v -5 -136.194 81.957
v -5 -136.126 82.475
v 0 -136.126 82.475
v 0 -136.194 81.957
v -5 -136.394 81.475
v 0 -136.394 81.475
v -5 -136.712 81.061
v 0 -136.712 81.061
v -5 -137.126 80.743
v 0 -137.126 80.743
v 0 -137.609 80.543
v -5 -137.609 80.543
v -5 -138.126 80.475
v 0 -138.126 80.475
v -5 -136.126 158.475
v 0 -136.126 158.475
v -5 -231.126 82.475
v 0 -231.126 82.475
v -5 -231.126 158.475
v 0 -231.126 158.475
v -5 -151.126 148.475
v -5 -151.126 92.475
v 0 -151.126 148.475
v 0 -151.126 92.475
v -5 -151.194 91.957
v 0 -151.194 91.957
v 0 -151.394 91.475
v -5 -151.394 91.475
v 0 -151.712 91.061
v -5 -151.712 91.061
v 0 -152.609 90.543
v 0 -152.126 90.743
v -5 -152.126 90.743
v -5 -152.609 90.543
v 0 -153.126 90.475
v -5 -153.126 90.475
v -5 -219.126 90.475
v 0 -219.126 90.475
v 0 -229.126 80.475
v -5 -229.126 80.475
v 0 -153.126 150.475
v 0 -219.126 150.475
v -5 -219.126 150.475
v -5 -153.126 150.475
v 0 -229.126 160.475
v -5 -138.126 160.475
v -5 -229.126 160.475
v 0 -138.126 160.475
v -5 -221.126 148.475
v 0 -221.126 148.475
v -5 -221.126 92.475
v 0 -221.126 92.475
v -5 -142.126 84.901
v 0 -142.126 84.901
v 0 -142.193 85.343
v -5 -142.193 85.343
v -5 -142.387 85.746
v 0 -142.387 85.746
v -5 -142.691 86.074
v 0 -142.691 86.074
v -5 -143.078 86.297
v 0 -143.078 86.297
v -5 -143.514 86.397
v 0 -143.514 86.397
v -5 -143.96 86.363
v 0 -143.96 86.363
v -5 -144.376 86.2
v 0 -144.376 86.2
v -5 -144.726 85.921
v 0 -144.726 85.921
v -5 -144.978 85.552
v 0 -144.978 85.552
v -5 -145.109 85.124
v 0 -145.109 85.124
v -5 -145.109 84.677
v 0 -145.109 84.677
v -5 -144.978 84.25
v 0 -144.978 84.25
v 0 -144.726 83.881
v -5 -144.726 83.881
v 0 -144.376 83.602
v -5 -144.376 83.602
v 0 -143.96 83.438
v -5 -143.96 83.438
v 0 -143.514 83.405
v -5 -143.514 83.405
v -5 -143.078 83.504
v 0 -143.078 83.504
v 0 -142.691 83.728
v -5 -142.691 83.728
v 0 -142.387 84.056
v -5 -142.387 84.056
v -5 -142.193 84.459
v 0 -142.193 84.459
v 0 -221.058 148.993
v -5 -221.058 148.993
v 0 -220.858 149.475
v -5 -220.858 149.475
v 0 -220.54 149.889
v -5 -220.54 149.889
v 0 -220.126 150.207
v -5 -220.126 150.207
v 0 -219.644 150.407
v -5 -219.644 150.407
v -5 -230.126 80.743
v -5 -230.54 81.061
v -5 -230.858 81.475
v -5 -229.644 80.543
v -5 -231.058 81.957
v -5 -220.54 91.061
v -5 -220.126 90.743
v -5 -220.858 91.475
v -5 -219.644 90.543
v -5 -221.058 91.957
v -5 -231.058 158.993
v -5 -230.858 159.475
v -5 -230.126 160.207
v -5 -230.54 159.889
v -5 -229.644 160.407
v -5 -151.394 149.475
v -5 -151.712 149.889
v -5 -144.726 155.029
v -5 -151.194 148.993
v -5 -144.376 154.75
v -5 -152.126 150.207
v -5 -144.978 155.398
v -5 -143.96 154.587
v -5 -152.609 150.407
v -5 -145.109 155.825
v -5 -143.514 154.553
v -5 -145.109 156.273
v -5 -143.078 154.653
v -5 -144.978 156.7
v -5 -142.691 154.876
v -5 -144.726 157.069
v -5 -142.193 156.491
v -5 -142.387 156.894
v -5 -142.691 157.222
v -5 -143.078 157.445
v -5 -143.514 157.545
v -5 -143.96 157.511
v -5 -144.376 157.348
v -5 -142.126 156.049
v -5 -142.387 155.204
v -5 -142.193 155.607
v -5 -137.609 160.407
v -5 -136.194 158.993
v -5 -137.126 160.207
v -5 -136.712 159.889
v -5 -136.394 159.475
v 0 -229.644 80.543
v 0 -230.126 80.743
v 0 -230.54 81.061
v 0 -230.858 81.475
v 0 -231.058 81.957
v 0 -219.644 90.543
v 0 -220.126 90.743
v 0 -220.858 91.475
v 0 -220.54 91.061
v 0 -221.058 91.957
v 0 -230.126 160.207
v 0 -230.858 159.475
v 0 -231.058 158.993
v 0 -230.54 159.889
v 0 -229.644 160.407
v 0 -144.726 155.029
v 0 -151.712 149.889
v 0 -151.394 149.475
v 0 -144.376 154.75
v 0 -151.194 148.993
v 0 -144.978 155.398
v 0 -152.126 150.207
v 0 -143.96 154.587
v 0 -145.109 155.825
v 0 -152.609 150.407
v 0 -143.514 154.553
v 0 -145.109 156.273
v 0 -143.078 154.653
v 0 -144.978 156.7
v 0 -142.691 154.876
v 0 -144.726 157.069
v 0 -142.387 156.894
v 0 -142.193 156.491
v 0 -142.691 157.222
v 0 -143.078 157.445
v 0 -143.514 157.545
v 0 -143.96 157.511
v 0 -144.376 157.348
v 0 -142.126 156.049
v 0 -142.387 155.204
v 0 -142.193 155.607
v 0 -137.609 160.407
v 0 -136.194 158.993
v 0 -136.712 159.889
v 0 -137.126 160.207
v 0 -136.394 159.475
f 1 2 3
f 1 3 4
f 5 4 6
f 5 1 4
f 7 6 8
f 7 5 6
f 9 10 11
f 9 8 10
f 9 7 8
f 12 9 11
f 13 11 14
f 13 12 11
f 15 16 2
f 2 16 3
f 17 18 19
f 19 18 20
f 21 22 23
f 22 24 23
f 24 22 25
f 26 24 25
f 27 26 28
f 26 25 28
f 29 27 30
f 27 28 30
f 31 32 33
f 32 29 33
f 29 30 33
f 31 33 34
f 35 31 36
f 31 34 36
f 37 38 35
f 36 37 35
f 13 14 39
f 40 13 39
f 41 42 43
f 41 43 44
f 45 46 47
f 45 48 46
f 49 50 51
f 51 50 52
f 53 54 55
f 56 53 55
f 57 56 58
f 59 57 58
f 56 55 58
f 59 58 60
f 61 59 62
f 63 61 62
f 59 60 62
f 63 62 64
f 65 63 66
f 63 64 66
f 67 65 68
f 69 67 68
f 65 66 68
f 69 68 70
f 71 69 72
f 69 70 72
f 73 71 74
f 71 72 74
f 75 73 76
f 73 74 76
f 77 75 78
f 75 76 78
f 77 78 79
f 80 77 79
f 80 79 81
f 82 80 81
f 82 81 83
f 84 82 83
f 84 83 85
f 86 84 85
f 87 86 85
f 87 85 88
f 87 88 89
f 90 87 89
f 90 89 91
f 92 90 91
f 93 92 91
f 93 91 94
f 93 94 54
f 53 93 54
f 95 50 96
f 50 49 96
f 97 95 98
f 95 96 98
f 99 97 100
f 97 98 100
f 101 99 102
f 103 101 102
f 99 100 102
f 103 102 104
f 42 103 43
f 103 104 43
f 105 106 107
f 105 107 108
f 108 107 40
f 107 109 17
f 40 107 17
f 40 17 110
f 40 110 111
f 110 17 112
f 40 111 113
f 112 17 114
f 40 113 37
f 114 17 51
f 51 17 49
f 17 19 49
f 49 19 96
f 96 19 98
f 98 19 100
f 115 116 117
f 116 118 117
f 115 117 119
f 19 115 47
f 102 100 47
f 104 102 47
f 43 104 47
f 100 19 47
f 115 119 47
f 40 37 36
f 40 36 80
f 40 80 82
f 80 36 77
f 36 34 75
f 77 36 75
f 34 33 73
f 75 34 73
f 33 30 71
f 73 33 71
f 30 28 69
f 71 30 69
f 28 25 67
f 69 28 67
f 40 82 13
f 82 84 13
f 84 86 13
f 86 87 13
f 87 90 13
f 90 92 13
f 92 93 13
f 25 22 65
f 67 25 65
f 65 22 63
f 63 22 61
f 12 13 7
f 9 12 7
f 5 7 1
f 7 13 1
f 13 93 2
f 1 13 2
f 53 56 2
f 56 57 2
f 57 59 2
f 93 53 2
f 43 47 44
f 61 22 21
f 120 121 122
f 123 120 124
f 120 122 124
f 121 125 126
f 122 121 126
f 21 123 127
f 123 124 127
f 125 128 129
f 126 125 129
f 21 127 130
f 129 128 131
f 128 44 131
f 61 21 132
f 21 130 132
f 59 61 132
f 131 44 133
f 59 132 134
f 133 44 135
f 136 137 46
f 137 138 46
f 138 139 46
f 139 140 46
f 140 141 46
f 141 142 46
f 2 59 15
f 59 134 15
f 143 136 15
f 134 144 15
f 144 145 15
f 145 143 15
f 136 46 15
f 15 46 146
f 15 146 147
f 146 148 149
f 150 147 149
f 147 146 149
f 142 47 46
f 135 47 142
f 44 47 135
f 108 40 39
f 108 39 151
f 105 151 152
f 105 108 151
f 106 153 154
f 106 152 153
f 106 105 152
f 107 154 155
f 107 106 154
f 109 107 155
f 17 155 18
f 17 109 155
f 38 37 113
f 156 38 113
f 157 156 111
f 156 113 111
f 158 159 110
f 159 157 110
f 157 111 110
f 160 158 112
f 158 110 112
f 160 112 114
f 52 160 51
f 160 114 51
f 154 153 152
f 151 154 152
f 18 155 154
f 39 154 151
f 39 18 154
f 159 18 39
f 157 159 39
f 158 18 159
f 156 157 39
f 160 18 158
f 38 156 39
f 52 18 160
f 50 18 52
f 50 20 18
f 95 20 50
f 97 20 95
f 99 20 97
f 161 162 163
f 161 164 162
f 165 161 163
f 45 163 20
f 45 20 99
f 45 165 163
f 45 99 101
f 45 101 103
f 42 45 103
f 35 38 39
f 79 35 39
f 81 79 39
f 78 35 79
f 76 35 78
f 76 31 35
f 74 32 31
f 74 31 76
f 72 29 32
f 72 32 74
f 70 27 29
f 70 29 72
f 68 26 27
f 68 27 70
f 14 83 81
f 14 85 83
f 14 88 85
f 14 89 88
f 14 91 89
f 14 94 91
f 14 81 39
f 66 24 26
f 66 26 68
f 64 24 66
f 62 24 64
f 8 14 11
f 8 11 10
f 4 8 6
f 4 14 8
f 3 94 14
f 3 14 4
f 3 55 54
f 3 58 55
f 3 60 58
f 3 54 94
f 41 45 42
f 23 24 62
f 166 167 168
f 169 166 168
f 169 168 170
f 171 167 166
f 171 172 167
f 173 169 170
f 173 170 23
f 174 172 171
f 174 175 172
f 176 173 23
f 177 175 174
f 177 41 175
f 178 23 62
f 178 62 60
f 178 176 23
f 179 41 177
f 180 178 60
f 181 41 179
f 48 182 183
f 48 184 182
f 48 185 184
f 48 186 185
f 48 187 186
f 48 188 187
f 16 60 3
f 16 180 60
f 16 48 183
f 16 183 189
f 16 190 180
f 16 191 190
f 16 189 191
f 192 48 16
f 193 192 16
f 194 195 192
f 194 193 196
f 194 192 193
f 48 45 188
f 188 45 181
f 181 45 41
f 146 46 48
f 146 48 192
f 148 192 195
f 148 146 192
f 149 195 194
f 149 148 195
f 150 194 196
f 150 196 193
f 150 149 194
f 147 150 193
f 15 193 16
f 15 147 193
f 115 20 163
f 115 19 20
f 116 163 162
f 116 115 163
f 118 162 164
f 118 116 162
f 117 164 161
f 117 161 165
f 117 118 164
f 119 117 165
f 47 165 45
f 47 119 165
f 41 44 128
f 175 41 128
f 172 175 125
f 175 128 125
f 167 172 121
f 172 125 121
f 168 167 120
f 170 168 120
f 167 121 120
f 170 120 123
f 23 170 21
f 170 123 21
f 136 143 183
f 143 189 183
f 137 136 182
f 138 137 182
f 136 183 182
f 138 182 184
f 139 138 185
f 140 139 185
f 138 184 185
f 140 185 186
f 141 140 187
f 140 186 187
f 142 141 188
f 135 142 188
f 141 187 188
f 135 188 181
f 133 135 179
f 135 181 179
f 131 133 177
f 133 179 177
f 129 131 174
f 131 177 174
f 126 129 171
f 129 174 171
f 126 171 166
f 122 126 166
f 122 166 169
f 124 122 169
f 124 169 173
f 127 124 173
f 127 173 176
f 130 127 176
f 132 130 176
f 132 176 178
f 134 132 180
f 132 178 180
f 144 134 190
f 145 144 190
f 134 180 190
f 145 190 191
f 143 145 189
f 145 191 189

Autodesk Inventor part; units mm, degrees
ref_plane "YZ Plane" through (0, 0, 0) normal (1, 0, 0) x (0, 1, 0)
ref_plane "XZ Plane" through (0, 0, 0) normal (0, 1, 0) x (-1, 0, 0)
ref_plane "XY Plane" through (0, 0, 0) normal (0, 0, 1) x (1, 0, 0)
sketch "スケッチ1" plane through (0, 0, 0) normal (1, 0, 0) x (0, 1, 0)
  line L0 (-151.1262, 435.4749) -> (478.8738, 435.4749)
  line L1 (478.8738, 435.4749) -> (478.8738, -194.5251)
  line L2 (478.8738, -194.5251) -> (-151.1262, -194.5251)
  line L3 (-151.1262, -194.5251) -> (-151.1262, 435.4749)
  line L4 (-151.1262, 435.4749) -> (478.8738, -194.5251) construction
  line L5 (478.8738, 435.4749) -> (-151.1262, -194.5251) construction
  line L6 (-151.1262, 342.6932) -> (-136.1262, 342.6932)
  line L7 (-136.1262, 342.6932) -> (-136.1262, -101.7433)
  line L8 (-136.1262, -101.7433) -> (-151.1262, -101.7433)
  line L9 (-151.1262, -101.7433) -> (-151.1262, 342.6932)
  line L10 (386.092, 435.4749) -> (-58.3445, 435.4749)
  line L11 (-58.3445, 435.4749) -> (-58.3445, 420.4749)
  line L12 (-58.3445, 420.4749) -> (386.092, 420.4749)
  line L13 (386.092, 420.4749) -> (386.092, 435.4749)
  line L14 (-58.3445, 420.4749) -> (-136.1262, 342.6932)
  line L15 (-136.1262, 342.6932) -> (-136.1262, 435.4749)
  line L16 (-58.3445, 420.4749) -> (-136.1262, 342.6932)
  line L17 (-136.1262, 342.6932) -> (-129.0552, 335.6221)
  line L18 (-129.0552, 335.6221) -> (-51.2734, 413.4039)
  line L19 (-51.2734, 413.4039) -> (-58.3445, 420.4749)
  line L20 (53.0814, 420.4749) -> (-136.1262, 231.2673)
  line L21 (53.0814, 420.4749) -> (-136.1262, 231.2673)
  line L22 (-136.1262, 231.2673) -> (-129.0552, 224.1962)
  line L23 (-129.0552, 224.1962) -> (60.1525, 413.4039)
  line L24 (60.1525, 413.4039) -> (53.0814, 420.4749)
  line L25 (163.8738, 120.4749) -> (-792.7235, 120.4749)
  line L26 (-58.3445, -179.5251) -> (-136.1262, -101.7433)
  line L27 (-136.1262, -101.7433) -> (-129.0552, -94.6723)
  line L28 (-129.0552, -94.6723) -> (-51.2734, -172.454)
  line L29 (-51.2734, -172.454) -> (-58.3445, -179.5251)
  line L30 (53.0814, -179.5251) -> (-136.1262, 9.6826)
  line L31 (-136.1262, 9.6826) -> (-129.0552, 16.7536)
  line L32 (-129.0552, 16.7536) -> (60.1525, -172.454)
  line L33 (60.1525, -172.454) -> (53.0814, -179.5251)
  circle A0 centre (163.8738, 120.4749) radius 400
  line L34 (-166.1262, 145.4749) -> (-216.1262, 145.4749)
  line L35 (-216.1262, 145.4749) -> (-216.1262, 95.4749)
  line L36 (-216.1262, 95.4749) -> (-166.1262, 95.4749)
  line L37 (-166.1262, 95.4749) -> (-166.1262, 145.4749)
  line L38 (163.8738, 120.4749) -> (163.8738, -510.4429)
  line L39 (386.092, 420.4749) -> (463.8738, 342.6932)
  line L40 (463.8738, 342.6932) -> (456.8027, 335.6221)
  line L41 (456.8027, 335.6221) -> (379.0209, 413.4039)
  line L42 (379.0209, 413.4039) -> (386.092, 420.4749)
  line L43 (274.6661, 420.4749) -> (463.8738, 231.2673)
  line L44 (463.8738, 231.2673) -> (456.8027, 224.1962)
  line L45 (456.8027, 224.1962) -> (267.5951, 413.4039)
  line L46 (267.5951, 413.4039) -> (274.6661, 420.4749)
  line L47 (456.8027, 16.7536) -> (267.5951, -172.454)
  line L48 (463.8738, 9.6826) -> (456.8027, 16.7536)
  line L49 (274.6661, -179.5251) -> (463.8738, 9.6826)
  line L50 (267.5951, -172.454) -> (274.6661, -179.5251)
  line L51 (463.8738, -101.7433) -> (456.8027, -94.6723)
  line L52 (386.092, -179.5251) -> (463.8738, -101.7433)
  line L53 (456.8027, -94.6723) -> (379.0209, -172.454)
  line L54 (379.0209, -172.454) -> (386.092, -179.5251)
  line L55 (-151.1262, 160.4749) -> (-231.1262, 160.4749)
  line L56 (-231.1262, 160.4749) -> (-231.1262, 150.4749)
  line L57 (-231.1262, 150.4749) -> (-151.1262, 150.4749)
  line L58 (-151.1262, 150.4749) -> (-151.1262, 160.4749)
  line L59 (-231.1262, 150.4749) -> (-221.1262, 150.4749)
  line L60 (-221.1262, 150.4749) -> (-221.1262, 120.4749)
  line L61 (-221.1262, 120.4749) -> (-231.1262, 120.4749)
  line L62 (-231.1262, 120.4749) -> (-231.1262, 150.4749)
  line L63 (463.8738, 342.6932) -> (478.8738, 342.6932)
  line L64 (478.8738, 342.6932) -> (478.8738, -101.7433)
  line L65 (478.8738, -101.7433) -> (463.8738, -101.7433)
  line L66 (463.8738, -101.7433) -> (463.8738, 342.6932)
  line L67 (-58.3445, -194.5251) -> (386.092, -194.5251)
  line L68 (386.092, -194.5251) -> (386.092, -179.5251)
  line L69 (386.092, -179.5251) -> (-58.3445, -179.5251)
  line L70 (-58.3445, -179.5251) -> (-58.3445, -194.5251)
  line L71 (378.3744, 409.2217) -> (452.6206, 334.9755)
  line L72 (452.6206, 334.9755) -> (417.8105, 300.1654)
  line L73 (417.8105, 300.1654) -> (343.5643, 374.4116)
  line L74 (343.5643, 374.4116) -> (378.3744, 409.2217)
  line L75 (478.8738, 435.4749) -> (163.8738, 120.4749)
  line L76 (478.8738, 265.4749) -> (-151.1262, 265.4749)
  line L77 (-151.1262, 265.4749) -> (-151.1262, 245.4749)
  line L78 (-151.1262, 245.4749) -> (478.8738, 245.4749)
  line L79 (478.8738, 245.4749) -> (478.8738, 265.4749)
  line L80 (478.8738, -24.5251) -> (-151.1262, -24.5251)
  line L81 (-151.1262, -4.5251) -> (478.8738, -4.5251)
  line L82 (478.8738, 265.4749) -> (498.8738, 265.4749)
  line L83 (498.8738, 265.4749) -> (498.8738, 285.4749)
  line L84 (498.8738, 285.4749) -> (478.8738, 285.4749)
  line L85 (478.8738, 285.4749) -> (478.8738, 265.4749)
  line L86 (478.8738, -24.5251) -> (498.8738, -24.5251)
  line L87 (498.8738, -24.5251) -> (498.8738, -44.5251)
  line L88 (498.8738, -44.5251) -> (478.8738, -44.5251)
  line L89 (478.8738, -44.5251) -> (478.8738, -24.5251)
  line L90 (498.8738, 285.4749) -> (511.3738, 285.4749)
  line L91 (504.3091, -44.5251) -> (494.3091, -44.5251)
  circle A1 centre (675.8738, 120.4749) radius 122.5
  line L92 (478.8738, 265.4749) -> (498.8738, 265.4749)
  line L93 (498.8738, 265.4749) -> (498.8738, 245.4749)
  line L94 (498.8738, 245.4749) -> (478.8738, 245.4749)
  line L95 (478.8738, 245.4749) -> (478.8738, 265.4749)
  line L96 (478.8738, -24.5251) -> (498.8738, -24.5251)
  line L97 (498.8738, -24.5251) -> (498.8738, -4.5251)
  line L98 (498.8738, -4.5251) -> (478.8738, -4.5251)
  line L99 (478.8738, -4.5251) -> (478.8738, -24.5251)
  line L100 (289.8738, 265.4749) -> (309.8738, 265.4749)
  line L101 (309.8738, 265.4749) -> (309.8738, 285.4749)
  line L102 (309.8738, 285.4749) -> (289.8738, 285.4749)
  line L103 (289.8738, 285.4749) -> (289.8738, 265.4749)
  line L104 (-129.0552, 335.6221) -> (-151.1262, 335.6221)
  circle A2 centre (-143.6262, 352.4749) radius 1.5
  circle A3 centre (-143.6262, 342.4749) radius 1.5
  line L105 (-136.1262, 362.4749) -> (-151.1262, 362.4749)
  line L106 (-58.3445, 427.9749) -> (-143.6262, 427.9749)
  line L107 (-143.6262, 427.9749) -> (-143.6262, 362.4749)
  circle A4 centre (-68.1262, 427.9749) radius 1.5
  circle A5 centre (-58.1262, 427.9749) radius 1.5
  line L108 (-78.1262, 435.4749) -> (-78.1262, 420.4749)
  line L109 (-58.3445, 420.4749) -> (-78.1262, 420.4749)
  circle A6 centre (-68.1262, -187.0251) radius 1.5
  circle A7 centre (-58.1262, -187.0251) radius 1.5
  circle A8 centre (-143.6262, -111.5251) radius 1.5
  circle A9 centre (-143.6262, -101.5251) radius 1.5
  line L110 (-136.1262, -121.5251) -> (-151.1262, -121.5251)
  line L111 (-78.1262, -194.5251) -> (-78.1262, -179.5251)
  line L112 (405.8738, 435.4749) -> (405.8738, 420.4749)
  circle A10 centre (395.8738, 427.9749) radius 1.5
  circle A11 centre (385.8738, 427.9749) radius 1.5
  line L113 (463.8738, 362.4749) -> (478.8738, 362.4749)
  circle A12 centre (471.3738, 352.4749) radius 1.5
  circle A13 centre (471.3738, 342.4749) radius 1.5
  line L114 (463.8738, -121.5251) -> (478.8738, -121.5251)
  circle A14 centre (471.3738, -111.5251) radius 1.5
  circle A15 centre (471.3738, -101.5251) radius 1.5
  line L115 (405.8738, -194.5251) -> (405.8738, -179.5251)
  circle A16 centre (395.8738, -187.0251) radius 1.5
  circle A17 centre (385.8738, -187.0251) radius 1.5
  line L116 (-136.1262, -101.7433) -> (-136.1262, -121.5251)
  line L117 (-58.3445, -179.5251) -> (-78.1262, -179.5251)
  line L118 (405.8738, -179.5251) -> (386.092, -179.5251)
  line L119 (463.8738, -101.7433) -> (463.8738, -121.5251)
  line L120 (463.8738, 362.4749) -> (463.8738, 342.6932)
  line L121 (386.092, 420.4749) -> (405.8738, 420.4749)
  circle A18 centre (-129.0552, 342.6932) radius 1.5
  circle A19 centre (-121.9841, 349.7643) radius 1.5
  circle A20 centre (-129.0552, 231.2673) radius 1.5
  circle A21 centre (-121.9841, 238.3384) radius 1.5
  circle A22 centre (-65.4156, 406.3328) radius 1.5
  circle A23 centre (-58.3445, 413.4039) radius 1.5
  circle A24 centre (46.0103, 406.3328) radius 1.5
  circle A25 centre (53.0814, 413.4039) radius 1.5
  circle A26 centre (-58.3445, -172.454) radius 1.5
  circle A27 centre (-65.4156, -165.3829) radius 1.5
  circle A28 centre (53.0814, -172.454) radius 1.5
  circle A29 centre (46.0103, -165.3829) radius 1.5
  circle A30 centre (-129.0552, -101.7433) radius 1.5
  circle A31 centre (-121.9841, -108.8144) radius 1.5
  circle A32 centre (-121.9841, 2.6115) radius 1.5
  circle A33 centre (-129.0552, 9.6826) radius 1.5
  circle A34 centre (456.8027, 9.6826) radius 1.5
  circle A35 centre (449.7316, 2.6115) radius 1.5
  circle A36 centre (456.8027, -101.7433) radius 1.5
  circle A37 centre (449.7316, -108.8144) radius 1.5
  circle A38 centre (393.1631, -165.3829) radius 1.5
  circle A39 centre (386.092, -172.454) radius 1.5
  circle A40 centre (281.7372, -165.3829) radius 1.5
  circle A41 centre (274.6661, -172.454) radius 1.5
  circle A42 centre (449.7316, 238.3384) radius 1.5
  circle A43 centre (456.8027, 231.2673) radius 1.5
  circle A44 centre (456.8027, 342.6932) radius 1.5
  circle A45 centre (449.7316, 349.7643) radius 1.5
  circle A46 centre (393.1631, 406.3328) radius 1.5
  circle A47 centre (386.092, 413.4039) radius 1.5
  circle A48 centre (274.6661, 413.4039) radius 1.5
  circle A49 centre (281.7372, 406.3328) radius 1.5
  circle A50 centre (-143.6262, 231.049) radius 1.5
  circle A51 centre (-143.6262, 241.049) radius 1.5
  circle A52 centre (43.2996, 427.9749) radius 1.5
  circle A53 centre (53.2996, 427.9749) radius 1.5
  circle A54 centre (-143.6262, 9.9008) radius 1.5
  circle A55 centre (-143.6262, -0.0992) radius 1.5
  circle A56 centre (43.2996, -187.0251) radius 1.5
  circle A57 centre (53.2996, -187.0251) radius 1.5
  circle A58 centre (274.4479, 427.9749) radius 1.5
  circle A59 centre (284.4479, 427.9749) radius 1.5
  circle A60 centre (471.3738, 241.049) radius 1.5
  circle A61 centre (471.3738, 231.049) radius 1.5
  circle A62 centre (471.3738, -0.0992) radius 1.5
  circle A63 centre (471.3738, 9.9008) radius 1.5
  circle A64 centre (284.4479, -187.0251) radius 1.5
  circle A65 centre (274.4479, -187.0251) radius 1.5
  circle A66 centre (471.3738, 255.4749) radius 1.5
  circle A67 centre (471.3738, -14.5251) radius 1.5
  circle A68 centre (-143.6262, -14.5251) radius 1.5
  circle A69 centre (-143.6262, 255.4749) radius 1.5
  circle A70 centre (314.8738, 255.4749) radius 1.5
  circle A71 centre (314.8738, -14.5251) radius 1.5
  circle A72 centre (-211.1262, 140.4749) radius 1.5
  line L122 (-191.1262, 145.4749) -> (-191.1262, 95.4749)
  circle A73 centre (-211.1262, 100.4749) radius 1.5
  circle A74 centre (-171.1262, 140.4749) radius 1.5
  circle A75 centre (-171.1262, 100.4749) radius 1.5
  circle A76 centre (-143.6262, 120.4749) radius 1.5
  circle A77 centre (-143.6262, 156.049) radius 1.5
  circle A78 centre (-171.1262, 155.4749) radius 1.5
  circle A79 centre (-211.1262, 155.4749) radius 1.5
  circle A80 centre (-226.1262, 135.4749) radius 1.5
  circle A81 centre (-226.1262, 105.4749) radius 1.5
  line L123 (-231.1262, 120.4749) -> (-231.1262, 90.4749)
  line L124 (-231.1262, 90.4749) -> (-151.1262, 90.4749)
  line L125 (-221.1262, 90.4749) -> (-221.1262, 120.4749)
  line L126 (-151.1262, 80.4749) -> (-231.1262, 80.4749)
  line L127 (-231.1262, 80.4749) -> (-231.1262, 90.4749)
  circle A82 centre (-211.1262, 85.4749) radius 1.5
  circle A83 centre (-171.1262, 85.4749) radius 1.5
  circle A84 centre (-143.6262, 84.9008) radius 1.5
  circle A85 centre (-191.1262, 120.4749) radius 10
  line L128 (-216.1262, 145.4749) -> (-191.1262, 120.4749)
  line L129 (-219.6618, 141.9394) -> (-194.6618, 116.9394)
  line L130 (-219.6618, 141.9394) -> (-221.1262, 143.4039)
  line L131 (-212.5907, 149.0105) -> (-187.5907, 124.0105)
  line L132 (-212.5907, 149.0105) -> (-214.0552, 150.4749)
  line L133 (-212.5907, 91.9394) -> (-187.5907, 116.9394)
  line L134 (-219.6618, 99.0105) -> (-194.6618, 124.0105)
  line L135 (-169.6618, 149.0105) -> (-194.6618, 124.0105)
  line L136 (-169.6618, 91.9394) -> (-194.6618, 116.9394)
  line L137 (-219.6618, 99.0105) -> (-221.1262, 97.546)
  line L138 (-212.5907, 91.9394) -> (-214.0552, 90.4749)
  line L139 (-169.6618, 149.0105) -> (-168.1973, 150.4749)
  line L140 (-169.6618, 91.9394) -> (-168.1973, 90.4749)
  line L141 (-151.1262, 160.4749) -> (-136.1262, 160.4749)
  line L142 (-151.1262, 80.4749) -> (-136.1262, 80.4749)
  line L143 (-151.1262, 150.4749) -> (-136.1262, 150.4749)
  line L144 (-151.1262, 90.4749) -> (-136.1262, 90.4749)
  point P0 (0, 0)
  point P1 (-151.1262, -24.5251)
  point P2 (478.8738, -4.5251)
  point P3 (-151.1262, 265.4749)
  dimension "d0" = 3
  dimension "d1" = 68
  dimension "d2" = 7.5
  dimension "d3" = 3
  dimension "d4" = 10
  dimension "d5" = 7.5
  dimension "d6" = 10
  dimension "d7" = 3
  dimension "d8" = 3
  dimension "d9" = 10
  dimension "d10" = 68
  dimension "d11" = 7.5
  dimension "d12" = 7.5
  dimension "d13" = 10
  dimension "d14" = 3
  dimension "d15" = 3
  dimension "d16" = 5
  dimension "d17" = 10
  dimension "d18" = 5
  dimension "d19" = 5
  dimension "d20" = 3
  dimension "d21" = 3
  dimension "d22" = 5
  dimension "d23" = 10
  dimension "d24" = 5
  dimension "d25" = 5
  dimension "d26" = 0.2182
  dimension "d27" = 3
  dimension "d28" = 7.5
  dimension "d29" = 0.2182
  dimension "d30" = 3
  dimension "d31" = 10
  dimension "d32" = 7.5
  dimension "d33" = 3
  dimension "d34" = 7.5
  dimension "d35" = 10
  dimension "d36" = 3
  dimension "d37" = 5
  dimension "d38" = 10
  dimension "d39" = 3
  dimension "d40" = 5
  dimension "d41" = 5
  dimension "d42" = 3
  dimension "d43" = 3
  dimension "d44" = 7.5
  dimension "d45" = 7.5
  dimension "d46" = 75
  dimension "d47" = 3
  dimension "d48" = 3
  dimension "d49" = 5
  dimension "d50" = 5
  dimension "d51" = 20
  dimension "d52" = 20
  dimension "d53" = 3
  dimension "d54" = 15
  dimension "d55" = 5
  dimension "d56" = 20
  dimension "d57" = 5
  dimension "d58" = 5
extrude "押し出し1" add sketch "スケッチ1" against normal blind 5 contours L62 L57 L60 L25 | L25 L125 L124 L123 | L56 L55 L3 L57 | L124 L3 L126 L127 | L141 L7 L143 L3 | L3 L144 L7 L142 | L143 L7 L25 A76 L3 | L3 L25 A76 L7 L144 | A76 L25 | L25 A76 | A78 | A79 | A80 | A81 | A82 | A83
fillet "フィレット1" radius 2 8 edges at (-2.5, -231.1262, 160.4749) (-2.5, -231.1262, 80.4749) (-2.5, -136.1262, 80.4749) (-2.5, -136.1262, 160.4749) (-2.5, -221.1262, 90.4749) (-2.5, -221.1262, 150.4749) (-2.5, -151.1262, 90.4749) (-2.5, -151.1262, 150.4749)
equation "\"d5\" = d2"
equation "\"d12\" = d11"
equation "\"d19\" = d18"
equation "\"d25\" = d24"
equation "\"d29\" = d26"
equation "\"d32\" = d28"
equation "\"d45\" = d44"
equation "\"d50\" = d49"
properties part number "base_weel-v1-Plate-lider-C" material "アルミニウム 6061"
